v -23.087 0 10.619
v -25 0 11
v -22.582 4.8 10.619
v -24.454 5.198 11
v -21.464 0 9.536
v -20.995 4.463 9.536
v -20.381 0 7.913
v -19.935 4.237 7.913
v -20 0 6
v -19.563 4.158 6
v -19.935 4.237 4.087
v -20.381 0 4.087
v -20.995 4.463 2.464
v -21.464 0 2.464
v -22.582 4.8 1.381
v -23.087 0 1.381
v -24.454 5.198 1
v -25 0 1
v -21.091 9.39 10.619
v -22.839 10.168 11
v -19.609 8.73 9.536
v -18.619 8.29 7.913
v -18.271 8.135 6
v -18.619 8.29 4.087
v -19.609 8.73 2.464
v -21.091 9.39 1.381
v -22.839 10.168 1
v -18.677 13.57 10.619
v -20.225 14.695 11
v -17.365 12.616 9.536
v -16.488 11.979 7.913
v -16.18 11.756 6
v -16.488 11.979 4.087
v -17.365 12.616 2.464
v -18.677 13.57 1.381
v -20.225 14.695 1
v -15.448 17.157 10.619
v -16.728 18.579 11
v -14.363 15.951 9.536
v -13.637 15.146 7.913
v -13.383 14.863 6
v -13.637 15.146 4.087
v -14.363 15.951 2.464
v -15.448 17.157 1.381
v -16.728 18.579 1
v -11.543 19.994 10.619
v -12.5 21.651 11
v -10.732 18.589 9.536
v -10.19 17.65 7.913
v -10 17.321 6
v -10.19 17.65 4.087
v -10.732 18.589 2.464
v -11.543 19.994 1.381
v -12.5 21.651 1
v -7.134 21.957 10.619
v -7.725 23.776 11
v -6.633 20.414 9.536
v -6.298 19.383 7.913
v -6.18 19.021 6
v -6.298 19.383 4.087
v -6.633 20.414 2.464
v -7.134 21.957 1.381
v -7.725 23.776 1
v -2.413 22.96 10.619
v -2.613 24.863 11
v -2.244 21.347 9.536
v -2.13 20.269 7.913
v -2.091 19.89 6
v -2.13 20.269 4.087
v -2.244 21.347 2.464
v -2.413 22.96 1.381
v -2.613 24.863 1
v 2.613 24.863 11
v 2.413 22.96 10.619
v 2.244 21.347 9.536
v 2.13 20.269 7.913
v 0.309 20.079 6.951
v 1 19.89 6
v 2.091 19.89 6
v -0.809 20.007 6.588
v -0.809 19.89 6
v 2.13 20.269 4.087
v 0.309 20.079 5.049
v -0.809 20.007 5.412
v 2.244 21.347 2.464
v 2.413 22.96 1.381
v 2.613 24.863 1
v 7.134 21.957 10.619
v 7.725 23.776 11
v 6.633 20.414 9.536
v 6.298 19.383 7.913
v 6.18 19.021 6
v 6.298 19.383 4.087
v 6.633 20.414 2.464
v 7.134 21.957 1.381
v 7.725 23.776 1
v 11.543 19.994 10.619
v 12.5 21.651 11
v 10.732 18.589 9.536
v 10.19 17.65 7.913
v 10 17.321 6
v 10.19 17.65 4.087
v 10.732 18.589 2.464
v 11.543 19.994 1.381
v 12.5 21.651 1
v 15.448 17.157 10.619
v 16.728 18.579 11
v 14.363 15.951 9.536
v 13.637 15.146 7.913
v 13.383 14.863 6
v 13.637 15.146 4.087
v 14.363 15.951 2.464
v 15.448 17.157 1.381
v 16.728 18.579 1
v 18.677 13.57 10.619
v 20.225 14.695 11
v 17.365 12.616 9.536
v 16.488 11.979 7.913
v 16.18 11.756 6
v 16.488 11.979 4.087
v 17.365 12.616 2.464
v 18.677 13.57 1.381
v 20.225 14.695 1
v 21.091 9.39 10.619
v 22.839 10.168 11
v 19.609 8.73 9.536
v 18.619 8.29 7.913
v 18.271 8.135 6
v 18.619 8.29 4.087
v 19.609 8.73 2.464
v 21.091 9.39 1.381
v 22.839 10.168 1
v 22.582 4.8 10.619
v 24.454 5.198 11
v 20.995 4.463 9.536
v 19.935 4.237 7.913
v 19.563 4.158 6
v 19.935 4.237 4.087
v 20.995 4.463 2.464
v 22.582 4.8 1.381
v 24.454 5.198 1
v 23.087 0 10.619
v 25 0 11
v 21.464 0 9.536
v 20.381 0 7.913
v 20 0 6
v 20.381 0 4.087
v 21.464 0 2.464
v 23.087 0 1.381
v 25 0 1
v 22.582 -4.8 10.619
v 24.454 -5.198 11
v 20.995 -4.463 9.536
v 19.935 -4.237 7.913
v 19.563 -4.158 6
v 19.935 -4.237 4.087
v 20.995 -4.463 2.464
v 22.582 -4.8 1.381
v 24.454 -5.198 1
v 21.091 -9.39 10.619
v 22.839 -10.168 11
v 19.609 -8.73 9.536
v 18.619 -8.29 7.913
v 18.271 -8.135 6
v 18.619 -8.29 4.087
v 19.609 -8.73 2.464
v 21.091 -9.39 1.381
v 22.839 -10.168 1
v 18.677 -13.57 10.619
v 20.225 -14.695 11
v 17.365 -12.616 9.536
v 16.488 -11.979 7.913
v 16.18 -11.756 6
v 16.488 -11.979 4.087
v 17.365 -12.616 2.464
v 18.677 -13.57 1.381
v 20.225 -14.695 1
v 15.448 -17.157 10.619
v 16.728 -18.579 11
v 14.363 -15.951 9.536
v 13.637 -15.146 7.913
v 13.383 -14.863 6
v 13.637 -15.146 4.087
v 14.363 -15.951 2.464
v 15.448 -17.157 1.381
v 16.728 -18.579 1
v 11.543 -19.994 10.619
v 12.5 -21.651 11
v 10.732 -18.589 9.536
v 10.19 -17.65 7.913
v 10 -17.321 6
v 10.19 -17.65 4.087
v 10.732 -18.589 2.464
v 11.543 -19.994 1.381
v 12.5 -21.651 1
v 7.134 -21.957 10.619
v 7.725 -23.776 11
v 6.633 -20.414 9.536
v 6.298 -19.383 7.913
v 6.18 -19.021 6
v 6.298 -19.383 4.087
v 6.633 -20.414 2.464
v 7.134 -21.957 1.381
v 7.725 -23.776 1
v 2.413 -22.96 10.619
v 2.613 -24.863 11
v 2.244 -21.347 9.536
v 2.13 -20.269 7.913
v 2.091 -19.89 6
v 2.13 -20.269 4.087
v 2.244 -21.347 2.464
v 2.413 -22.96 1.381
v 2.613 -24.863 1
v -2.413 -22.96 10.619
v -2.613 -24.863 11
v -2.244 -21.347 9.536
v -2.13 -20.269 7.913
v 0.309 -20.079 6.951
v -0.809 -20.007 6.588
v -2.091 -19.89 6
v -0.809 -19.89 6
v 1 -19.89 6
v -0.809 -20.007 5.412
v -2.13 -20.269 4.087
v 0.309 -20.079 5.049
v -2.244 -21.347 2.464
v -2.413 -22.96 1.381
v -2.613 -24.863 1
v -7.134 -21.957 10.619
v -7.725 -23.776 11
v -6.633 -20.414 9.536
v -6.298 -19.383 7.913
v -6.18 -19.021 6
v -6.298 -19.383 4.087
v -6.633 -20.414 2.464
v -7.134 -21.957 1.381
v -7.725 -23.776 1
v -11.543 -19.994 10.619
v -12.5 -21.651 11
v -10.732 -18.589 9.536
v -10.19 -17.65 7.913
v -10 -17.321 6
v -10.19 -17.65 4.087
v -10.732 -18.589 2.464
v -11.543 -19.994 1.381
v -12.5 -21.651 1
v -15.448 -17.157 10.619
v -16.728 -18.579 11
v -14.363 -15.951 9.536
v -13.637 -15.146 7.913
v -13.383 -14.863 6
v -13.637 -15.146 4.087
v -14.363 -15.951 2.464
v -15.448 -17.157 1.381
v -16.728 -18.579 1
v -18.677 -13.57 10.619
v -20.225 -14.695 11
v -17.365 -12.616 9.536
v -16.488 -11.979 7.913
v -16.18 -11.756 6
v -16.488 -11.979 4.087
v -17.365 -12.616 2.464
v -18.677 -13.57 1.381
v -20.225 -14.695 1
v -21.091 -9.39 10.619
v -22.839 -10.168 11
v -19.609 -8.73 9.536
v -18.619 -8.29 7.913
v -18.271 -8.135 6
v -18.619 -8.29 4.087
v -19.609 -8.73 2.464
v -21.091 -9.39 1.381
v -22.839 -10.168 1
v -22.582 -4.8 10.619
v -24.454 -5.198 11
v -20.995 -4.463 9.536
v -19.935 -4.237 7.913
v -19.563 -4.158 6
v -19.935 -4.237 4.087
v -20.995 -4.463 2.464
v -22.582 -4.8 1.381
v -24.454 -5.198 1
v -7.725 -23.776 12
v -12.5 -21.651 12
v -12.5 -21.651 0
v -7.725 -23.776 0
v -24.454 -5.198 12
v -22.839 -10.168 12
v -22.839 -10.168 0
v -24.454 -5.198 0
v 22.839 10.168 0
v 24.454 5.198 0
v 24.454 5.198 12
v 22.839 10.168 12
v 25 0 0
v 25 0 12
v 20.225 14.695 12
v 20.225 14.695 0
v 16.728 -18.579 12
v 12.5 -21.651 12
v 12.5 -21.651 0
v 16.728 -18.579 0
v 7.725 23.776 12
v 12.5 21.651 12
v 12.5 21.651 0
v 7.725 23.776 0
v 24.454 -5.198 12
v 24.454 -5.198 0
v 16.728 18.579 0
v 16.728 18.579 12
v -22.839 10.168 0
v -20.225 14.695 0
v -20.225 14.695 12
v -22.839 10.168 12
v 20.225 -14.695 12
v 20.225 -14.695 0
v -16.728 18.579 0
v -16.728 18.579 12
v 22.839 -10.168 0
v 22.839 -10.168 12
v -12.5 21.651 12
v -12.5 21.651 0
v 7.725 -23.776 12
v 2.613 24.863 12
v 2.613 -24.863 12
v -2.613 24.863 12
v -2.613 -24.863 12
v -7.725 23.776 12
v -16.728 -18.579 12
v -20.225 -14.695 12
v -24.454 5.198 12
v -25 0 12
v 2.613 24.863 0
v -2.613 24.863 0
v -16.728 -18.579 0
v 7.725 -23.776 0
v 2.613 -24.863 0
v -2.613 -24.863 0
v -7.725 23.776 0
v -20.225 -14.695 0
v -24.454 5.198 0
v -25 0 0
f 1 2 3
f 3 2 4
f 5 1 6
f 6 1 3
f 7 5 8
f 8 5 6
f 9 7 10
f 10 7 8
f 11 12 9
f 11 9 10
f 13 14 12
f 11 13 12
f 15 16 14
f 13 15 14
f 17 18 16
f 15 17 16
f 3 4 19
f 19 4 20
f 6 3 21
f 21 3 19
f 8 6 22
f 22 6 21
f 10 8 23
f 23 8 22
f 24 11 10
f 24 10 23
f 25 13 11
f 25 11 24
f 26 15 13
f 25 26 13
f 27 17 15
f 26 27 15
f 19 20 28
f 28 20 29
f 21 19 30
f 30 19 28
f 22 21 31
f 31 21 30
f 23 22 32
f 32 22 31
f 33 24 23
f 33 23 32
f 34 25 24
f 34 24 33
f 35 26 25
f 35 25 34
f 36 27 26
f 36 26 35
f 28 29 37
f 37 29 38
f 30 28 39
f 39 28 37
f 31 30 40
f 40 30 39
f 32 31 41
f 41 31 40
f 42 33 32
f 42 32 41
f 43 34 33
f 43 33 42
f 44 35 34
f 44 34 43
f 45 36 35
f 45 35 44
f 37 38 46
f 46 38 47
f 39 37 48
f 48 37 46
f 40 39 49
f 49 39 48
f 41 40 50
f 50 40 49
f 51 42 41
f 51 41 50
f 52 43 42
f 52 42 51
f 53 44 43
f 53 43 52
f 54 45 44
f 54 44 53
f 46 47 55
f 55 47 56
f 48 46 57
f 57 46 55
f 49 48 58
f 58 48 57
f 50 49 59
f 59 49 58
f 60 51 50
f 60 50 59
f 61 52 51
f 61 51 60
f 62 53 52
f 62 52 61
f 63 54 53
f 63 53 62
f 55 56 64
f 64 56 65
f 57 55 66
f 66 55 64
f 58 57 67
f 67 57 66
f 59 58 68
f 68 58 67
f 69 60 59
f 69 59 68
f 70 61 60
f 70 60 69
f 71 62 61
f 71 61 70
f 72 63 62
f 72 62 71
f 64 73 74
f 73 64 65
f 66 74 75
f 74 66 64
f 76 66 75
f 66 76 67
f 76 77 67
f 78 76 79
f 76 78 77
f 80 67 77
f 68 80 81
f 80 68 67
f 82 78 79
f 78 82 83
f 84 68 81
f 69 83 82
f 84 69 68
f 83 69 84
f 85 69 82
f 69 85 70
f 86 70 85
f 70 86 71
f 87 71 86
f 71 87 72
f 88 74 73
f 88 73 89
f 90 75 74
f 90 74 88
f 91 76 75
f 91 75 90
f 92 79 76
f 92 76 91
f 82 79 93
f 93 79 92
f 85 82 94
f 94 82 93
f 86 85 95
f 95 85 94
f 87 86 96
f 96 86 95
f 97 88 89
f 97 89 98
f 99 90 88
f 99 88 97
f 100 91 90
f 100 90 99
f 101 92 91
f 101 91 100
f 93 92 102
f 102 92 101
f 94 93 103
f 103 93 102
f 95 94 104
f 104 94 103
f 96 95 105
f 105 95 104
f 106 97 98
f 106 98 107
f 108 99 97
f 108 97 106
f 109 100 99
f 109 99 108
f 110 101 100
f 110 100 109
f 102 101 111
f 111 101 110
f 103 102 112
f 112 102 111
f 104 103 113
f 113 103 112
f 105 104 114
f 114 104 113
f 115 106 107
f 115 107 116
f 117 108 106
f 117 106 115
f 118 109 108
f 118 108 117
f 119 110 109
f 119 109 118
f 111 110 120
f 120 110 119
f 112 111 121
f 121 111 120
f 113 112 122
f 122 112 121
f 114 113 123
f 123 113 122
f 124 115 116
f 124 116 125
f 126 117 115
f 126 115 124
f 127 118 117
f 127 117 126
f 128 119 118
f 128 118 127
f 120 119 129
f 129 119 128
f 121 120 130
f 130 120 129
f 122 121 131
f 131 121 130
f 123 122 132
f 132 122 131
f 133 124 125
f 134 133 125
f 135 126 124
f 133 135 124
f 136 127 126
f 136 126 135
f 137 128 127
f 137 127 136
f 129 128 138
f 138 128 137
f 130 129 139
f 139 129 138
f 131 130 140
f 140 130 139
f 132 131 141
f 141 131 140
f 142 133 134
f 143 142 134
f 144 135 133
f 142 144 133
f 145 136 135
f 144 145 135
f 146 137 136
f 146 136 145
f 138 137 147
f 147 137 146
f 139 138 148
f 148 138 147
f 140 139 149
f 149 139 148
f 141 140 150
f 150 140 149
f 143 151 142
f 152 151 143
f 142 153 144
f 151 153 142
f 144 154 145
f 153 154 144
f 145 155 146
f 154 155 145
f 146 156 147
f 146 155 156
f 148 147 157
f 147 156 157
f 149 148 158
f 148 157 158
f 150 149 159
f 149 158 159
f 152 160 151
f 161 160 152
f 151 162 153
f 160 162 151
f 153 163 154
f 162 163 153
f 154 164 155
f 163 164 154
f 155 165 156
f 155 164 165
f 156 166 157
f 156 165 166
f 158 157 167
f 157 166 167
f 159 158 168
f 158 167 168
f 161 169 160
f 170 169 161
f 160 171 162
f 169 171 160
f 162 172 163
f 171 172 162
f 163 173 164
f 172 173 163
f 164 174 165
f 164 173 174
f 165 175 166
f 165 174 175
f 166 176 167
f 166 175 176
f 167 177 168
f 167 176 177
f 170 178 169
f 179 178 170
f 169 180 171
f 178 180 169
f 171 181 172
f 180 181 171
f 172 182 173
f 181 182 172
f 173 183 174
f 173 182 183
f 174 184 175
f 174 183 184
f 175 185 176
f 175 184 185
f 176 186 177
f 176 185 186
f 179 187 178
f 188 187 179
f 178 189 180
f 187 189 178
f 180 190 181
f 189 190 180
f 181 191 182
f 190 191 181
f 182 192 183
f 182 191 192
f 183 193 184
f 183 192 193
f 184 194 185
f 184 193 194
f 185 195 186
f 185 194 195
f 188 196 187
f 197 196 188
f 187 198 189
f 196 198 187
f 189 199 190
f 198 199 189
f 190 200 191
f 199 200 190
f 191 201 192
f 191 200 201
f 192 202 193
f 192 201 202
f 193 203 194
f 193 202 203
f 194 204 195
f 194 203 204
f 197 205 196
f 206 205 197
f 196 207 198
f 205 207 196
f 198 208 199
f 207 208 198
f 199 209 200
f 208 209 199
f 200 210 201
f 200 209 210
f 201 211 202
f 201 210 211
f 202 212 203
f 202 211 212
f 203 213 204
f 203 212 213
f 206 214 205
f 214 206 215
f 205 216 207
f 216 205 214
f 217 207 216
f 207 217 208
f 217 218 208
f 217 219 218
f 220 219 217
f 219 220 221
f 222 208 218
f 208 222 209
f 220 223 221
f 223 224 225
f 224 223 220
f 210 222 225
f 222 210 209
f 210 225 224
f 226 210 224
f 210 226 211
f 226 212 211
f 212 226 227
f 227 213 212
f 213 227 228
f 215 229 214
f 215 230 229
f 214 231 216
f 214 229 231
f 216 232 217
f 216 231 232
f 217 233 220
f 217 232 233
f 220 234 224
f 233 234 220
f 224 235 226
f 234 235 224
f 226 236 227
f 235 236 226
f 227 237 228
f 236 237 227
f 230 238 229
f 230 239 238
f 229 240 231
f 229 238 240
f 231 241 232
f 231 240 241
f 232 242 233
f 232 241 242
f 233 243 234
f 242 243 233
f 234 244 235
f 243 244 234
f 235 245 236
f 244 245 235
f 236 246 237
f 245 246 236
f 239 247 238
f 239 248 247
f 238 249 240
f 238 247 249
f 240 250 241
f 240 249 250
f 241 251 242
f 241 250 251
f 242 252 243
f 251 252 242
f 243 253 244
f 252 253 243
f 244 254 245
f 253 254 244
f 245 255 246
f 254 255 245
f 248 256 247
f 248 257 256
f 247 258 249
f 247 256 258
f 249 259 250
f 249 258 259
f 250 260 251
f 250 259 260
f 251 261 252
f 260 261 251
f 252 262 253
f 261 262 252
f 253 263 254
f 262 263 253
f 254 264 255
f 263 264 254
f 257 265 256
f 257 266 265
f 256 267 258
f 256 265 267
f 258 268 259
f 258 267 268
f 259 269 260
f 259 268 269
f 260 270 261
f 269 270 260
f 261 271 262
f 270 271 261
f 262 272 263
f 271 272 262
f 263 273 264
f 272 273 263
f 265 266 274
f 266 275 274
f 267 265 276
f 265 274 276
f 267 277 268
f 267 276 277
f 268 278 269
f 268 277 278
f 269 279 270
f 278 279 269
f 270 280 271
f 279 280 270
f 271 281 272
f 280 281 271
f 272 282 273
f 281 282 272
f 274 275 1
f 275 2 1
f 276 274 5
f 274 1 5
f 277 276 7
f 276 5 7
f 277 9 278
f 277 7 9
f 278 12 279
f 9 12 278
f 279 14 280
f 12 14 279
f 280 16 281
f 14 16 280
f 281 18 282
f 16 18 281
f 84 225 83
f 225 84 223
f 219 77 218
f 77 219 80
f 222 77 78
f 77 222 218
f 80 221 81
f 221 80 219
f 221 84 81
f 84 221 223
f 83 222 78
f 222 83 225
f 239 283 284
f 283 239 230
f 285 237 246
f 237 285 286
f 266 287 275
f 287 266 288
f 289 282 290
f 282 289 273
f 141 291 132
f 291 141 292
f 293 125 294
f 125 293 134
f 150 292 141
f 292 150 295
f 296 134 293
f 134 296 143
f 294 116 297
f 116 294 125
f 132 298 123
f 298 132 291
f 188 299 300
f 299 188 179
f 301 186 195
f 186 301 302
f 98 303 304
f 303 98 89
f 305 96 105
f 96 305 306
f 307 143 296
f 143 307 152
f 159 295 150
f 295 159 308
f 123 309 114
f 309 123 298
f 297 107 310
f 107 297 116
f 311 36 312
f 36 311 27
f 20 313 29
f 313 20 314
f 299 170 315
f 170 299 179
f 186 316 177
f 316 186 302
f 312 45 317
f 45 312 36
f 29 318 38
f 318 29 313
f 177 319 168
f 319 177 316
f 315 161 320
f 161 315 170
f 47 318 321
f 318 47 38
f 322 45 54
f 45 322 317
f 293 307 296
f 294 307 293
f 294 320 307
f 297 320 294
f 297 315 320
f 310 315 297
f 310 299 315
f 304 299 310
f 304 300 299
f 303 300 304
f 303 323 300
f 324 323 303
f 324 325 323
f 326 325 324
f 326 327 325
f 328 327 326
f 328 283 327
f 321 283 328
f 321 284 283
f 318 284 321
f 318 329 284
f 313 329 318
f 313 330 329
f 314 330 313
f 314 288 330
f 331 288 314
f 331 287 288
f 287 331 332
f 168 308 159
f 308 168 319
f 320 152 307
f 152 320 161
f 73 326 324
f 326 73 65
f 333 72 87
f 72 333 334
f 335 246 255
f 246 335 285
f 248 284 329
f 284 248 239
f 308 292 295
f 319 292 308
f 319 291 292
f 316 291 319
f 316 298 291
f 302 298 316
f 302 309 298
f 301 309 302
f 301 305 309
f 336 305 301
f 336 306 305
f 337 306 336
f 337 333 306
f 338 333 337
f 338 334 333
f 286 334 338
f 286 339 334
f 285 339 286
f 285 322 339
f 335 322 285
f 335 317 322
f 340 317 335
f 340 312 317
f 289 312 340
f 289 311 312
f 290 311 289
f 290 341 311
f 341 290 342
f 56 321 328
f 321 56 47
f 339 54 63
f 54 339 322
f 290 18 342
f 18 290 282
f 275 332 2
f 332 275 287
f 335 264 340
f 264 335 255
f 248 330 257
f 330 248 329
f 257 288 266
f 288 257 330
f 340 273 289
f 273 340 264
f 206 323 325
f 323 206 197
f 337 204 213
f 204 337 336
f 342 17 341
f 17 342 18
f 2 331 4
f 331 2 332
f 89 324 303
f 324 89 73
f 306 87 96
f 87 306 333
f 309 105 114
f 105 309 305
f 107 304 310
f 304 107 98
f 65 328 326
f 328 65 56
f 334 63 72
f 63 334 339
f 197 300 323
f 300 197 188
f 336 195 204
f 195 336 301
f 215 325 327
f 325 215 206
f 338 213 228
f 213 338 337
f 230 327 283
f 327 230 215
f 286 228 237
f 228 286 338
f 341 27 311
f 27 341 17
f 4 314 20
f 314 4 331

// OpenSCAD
outerdia = 50;
cutoutdia = 10;
wireholedia = 2;
addthick = 1;

difference(){
    union(){
        cylinder(r = outerdia/2, h = cutoutdia+addthick*2);
    }
    
    union(){
        translate([0,0,addthick+cutoutdia/2]){rotate_extrude(angle=360){
        translate([outerdia/2,0]){circle(d = cutoutdia);}}}
        
        translate([0,outerdia/2,addthick+cutoutdia/2]){rotate(a = [90,0,0]){cylinder(r = wireholedia/2, h = outerdia);}}
    }
}
